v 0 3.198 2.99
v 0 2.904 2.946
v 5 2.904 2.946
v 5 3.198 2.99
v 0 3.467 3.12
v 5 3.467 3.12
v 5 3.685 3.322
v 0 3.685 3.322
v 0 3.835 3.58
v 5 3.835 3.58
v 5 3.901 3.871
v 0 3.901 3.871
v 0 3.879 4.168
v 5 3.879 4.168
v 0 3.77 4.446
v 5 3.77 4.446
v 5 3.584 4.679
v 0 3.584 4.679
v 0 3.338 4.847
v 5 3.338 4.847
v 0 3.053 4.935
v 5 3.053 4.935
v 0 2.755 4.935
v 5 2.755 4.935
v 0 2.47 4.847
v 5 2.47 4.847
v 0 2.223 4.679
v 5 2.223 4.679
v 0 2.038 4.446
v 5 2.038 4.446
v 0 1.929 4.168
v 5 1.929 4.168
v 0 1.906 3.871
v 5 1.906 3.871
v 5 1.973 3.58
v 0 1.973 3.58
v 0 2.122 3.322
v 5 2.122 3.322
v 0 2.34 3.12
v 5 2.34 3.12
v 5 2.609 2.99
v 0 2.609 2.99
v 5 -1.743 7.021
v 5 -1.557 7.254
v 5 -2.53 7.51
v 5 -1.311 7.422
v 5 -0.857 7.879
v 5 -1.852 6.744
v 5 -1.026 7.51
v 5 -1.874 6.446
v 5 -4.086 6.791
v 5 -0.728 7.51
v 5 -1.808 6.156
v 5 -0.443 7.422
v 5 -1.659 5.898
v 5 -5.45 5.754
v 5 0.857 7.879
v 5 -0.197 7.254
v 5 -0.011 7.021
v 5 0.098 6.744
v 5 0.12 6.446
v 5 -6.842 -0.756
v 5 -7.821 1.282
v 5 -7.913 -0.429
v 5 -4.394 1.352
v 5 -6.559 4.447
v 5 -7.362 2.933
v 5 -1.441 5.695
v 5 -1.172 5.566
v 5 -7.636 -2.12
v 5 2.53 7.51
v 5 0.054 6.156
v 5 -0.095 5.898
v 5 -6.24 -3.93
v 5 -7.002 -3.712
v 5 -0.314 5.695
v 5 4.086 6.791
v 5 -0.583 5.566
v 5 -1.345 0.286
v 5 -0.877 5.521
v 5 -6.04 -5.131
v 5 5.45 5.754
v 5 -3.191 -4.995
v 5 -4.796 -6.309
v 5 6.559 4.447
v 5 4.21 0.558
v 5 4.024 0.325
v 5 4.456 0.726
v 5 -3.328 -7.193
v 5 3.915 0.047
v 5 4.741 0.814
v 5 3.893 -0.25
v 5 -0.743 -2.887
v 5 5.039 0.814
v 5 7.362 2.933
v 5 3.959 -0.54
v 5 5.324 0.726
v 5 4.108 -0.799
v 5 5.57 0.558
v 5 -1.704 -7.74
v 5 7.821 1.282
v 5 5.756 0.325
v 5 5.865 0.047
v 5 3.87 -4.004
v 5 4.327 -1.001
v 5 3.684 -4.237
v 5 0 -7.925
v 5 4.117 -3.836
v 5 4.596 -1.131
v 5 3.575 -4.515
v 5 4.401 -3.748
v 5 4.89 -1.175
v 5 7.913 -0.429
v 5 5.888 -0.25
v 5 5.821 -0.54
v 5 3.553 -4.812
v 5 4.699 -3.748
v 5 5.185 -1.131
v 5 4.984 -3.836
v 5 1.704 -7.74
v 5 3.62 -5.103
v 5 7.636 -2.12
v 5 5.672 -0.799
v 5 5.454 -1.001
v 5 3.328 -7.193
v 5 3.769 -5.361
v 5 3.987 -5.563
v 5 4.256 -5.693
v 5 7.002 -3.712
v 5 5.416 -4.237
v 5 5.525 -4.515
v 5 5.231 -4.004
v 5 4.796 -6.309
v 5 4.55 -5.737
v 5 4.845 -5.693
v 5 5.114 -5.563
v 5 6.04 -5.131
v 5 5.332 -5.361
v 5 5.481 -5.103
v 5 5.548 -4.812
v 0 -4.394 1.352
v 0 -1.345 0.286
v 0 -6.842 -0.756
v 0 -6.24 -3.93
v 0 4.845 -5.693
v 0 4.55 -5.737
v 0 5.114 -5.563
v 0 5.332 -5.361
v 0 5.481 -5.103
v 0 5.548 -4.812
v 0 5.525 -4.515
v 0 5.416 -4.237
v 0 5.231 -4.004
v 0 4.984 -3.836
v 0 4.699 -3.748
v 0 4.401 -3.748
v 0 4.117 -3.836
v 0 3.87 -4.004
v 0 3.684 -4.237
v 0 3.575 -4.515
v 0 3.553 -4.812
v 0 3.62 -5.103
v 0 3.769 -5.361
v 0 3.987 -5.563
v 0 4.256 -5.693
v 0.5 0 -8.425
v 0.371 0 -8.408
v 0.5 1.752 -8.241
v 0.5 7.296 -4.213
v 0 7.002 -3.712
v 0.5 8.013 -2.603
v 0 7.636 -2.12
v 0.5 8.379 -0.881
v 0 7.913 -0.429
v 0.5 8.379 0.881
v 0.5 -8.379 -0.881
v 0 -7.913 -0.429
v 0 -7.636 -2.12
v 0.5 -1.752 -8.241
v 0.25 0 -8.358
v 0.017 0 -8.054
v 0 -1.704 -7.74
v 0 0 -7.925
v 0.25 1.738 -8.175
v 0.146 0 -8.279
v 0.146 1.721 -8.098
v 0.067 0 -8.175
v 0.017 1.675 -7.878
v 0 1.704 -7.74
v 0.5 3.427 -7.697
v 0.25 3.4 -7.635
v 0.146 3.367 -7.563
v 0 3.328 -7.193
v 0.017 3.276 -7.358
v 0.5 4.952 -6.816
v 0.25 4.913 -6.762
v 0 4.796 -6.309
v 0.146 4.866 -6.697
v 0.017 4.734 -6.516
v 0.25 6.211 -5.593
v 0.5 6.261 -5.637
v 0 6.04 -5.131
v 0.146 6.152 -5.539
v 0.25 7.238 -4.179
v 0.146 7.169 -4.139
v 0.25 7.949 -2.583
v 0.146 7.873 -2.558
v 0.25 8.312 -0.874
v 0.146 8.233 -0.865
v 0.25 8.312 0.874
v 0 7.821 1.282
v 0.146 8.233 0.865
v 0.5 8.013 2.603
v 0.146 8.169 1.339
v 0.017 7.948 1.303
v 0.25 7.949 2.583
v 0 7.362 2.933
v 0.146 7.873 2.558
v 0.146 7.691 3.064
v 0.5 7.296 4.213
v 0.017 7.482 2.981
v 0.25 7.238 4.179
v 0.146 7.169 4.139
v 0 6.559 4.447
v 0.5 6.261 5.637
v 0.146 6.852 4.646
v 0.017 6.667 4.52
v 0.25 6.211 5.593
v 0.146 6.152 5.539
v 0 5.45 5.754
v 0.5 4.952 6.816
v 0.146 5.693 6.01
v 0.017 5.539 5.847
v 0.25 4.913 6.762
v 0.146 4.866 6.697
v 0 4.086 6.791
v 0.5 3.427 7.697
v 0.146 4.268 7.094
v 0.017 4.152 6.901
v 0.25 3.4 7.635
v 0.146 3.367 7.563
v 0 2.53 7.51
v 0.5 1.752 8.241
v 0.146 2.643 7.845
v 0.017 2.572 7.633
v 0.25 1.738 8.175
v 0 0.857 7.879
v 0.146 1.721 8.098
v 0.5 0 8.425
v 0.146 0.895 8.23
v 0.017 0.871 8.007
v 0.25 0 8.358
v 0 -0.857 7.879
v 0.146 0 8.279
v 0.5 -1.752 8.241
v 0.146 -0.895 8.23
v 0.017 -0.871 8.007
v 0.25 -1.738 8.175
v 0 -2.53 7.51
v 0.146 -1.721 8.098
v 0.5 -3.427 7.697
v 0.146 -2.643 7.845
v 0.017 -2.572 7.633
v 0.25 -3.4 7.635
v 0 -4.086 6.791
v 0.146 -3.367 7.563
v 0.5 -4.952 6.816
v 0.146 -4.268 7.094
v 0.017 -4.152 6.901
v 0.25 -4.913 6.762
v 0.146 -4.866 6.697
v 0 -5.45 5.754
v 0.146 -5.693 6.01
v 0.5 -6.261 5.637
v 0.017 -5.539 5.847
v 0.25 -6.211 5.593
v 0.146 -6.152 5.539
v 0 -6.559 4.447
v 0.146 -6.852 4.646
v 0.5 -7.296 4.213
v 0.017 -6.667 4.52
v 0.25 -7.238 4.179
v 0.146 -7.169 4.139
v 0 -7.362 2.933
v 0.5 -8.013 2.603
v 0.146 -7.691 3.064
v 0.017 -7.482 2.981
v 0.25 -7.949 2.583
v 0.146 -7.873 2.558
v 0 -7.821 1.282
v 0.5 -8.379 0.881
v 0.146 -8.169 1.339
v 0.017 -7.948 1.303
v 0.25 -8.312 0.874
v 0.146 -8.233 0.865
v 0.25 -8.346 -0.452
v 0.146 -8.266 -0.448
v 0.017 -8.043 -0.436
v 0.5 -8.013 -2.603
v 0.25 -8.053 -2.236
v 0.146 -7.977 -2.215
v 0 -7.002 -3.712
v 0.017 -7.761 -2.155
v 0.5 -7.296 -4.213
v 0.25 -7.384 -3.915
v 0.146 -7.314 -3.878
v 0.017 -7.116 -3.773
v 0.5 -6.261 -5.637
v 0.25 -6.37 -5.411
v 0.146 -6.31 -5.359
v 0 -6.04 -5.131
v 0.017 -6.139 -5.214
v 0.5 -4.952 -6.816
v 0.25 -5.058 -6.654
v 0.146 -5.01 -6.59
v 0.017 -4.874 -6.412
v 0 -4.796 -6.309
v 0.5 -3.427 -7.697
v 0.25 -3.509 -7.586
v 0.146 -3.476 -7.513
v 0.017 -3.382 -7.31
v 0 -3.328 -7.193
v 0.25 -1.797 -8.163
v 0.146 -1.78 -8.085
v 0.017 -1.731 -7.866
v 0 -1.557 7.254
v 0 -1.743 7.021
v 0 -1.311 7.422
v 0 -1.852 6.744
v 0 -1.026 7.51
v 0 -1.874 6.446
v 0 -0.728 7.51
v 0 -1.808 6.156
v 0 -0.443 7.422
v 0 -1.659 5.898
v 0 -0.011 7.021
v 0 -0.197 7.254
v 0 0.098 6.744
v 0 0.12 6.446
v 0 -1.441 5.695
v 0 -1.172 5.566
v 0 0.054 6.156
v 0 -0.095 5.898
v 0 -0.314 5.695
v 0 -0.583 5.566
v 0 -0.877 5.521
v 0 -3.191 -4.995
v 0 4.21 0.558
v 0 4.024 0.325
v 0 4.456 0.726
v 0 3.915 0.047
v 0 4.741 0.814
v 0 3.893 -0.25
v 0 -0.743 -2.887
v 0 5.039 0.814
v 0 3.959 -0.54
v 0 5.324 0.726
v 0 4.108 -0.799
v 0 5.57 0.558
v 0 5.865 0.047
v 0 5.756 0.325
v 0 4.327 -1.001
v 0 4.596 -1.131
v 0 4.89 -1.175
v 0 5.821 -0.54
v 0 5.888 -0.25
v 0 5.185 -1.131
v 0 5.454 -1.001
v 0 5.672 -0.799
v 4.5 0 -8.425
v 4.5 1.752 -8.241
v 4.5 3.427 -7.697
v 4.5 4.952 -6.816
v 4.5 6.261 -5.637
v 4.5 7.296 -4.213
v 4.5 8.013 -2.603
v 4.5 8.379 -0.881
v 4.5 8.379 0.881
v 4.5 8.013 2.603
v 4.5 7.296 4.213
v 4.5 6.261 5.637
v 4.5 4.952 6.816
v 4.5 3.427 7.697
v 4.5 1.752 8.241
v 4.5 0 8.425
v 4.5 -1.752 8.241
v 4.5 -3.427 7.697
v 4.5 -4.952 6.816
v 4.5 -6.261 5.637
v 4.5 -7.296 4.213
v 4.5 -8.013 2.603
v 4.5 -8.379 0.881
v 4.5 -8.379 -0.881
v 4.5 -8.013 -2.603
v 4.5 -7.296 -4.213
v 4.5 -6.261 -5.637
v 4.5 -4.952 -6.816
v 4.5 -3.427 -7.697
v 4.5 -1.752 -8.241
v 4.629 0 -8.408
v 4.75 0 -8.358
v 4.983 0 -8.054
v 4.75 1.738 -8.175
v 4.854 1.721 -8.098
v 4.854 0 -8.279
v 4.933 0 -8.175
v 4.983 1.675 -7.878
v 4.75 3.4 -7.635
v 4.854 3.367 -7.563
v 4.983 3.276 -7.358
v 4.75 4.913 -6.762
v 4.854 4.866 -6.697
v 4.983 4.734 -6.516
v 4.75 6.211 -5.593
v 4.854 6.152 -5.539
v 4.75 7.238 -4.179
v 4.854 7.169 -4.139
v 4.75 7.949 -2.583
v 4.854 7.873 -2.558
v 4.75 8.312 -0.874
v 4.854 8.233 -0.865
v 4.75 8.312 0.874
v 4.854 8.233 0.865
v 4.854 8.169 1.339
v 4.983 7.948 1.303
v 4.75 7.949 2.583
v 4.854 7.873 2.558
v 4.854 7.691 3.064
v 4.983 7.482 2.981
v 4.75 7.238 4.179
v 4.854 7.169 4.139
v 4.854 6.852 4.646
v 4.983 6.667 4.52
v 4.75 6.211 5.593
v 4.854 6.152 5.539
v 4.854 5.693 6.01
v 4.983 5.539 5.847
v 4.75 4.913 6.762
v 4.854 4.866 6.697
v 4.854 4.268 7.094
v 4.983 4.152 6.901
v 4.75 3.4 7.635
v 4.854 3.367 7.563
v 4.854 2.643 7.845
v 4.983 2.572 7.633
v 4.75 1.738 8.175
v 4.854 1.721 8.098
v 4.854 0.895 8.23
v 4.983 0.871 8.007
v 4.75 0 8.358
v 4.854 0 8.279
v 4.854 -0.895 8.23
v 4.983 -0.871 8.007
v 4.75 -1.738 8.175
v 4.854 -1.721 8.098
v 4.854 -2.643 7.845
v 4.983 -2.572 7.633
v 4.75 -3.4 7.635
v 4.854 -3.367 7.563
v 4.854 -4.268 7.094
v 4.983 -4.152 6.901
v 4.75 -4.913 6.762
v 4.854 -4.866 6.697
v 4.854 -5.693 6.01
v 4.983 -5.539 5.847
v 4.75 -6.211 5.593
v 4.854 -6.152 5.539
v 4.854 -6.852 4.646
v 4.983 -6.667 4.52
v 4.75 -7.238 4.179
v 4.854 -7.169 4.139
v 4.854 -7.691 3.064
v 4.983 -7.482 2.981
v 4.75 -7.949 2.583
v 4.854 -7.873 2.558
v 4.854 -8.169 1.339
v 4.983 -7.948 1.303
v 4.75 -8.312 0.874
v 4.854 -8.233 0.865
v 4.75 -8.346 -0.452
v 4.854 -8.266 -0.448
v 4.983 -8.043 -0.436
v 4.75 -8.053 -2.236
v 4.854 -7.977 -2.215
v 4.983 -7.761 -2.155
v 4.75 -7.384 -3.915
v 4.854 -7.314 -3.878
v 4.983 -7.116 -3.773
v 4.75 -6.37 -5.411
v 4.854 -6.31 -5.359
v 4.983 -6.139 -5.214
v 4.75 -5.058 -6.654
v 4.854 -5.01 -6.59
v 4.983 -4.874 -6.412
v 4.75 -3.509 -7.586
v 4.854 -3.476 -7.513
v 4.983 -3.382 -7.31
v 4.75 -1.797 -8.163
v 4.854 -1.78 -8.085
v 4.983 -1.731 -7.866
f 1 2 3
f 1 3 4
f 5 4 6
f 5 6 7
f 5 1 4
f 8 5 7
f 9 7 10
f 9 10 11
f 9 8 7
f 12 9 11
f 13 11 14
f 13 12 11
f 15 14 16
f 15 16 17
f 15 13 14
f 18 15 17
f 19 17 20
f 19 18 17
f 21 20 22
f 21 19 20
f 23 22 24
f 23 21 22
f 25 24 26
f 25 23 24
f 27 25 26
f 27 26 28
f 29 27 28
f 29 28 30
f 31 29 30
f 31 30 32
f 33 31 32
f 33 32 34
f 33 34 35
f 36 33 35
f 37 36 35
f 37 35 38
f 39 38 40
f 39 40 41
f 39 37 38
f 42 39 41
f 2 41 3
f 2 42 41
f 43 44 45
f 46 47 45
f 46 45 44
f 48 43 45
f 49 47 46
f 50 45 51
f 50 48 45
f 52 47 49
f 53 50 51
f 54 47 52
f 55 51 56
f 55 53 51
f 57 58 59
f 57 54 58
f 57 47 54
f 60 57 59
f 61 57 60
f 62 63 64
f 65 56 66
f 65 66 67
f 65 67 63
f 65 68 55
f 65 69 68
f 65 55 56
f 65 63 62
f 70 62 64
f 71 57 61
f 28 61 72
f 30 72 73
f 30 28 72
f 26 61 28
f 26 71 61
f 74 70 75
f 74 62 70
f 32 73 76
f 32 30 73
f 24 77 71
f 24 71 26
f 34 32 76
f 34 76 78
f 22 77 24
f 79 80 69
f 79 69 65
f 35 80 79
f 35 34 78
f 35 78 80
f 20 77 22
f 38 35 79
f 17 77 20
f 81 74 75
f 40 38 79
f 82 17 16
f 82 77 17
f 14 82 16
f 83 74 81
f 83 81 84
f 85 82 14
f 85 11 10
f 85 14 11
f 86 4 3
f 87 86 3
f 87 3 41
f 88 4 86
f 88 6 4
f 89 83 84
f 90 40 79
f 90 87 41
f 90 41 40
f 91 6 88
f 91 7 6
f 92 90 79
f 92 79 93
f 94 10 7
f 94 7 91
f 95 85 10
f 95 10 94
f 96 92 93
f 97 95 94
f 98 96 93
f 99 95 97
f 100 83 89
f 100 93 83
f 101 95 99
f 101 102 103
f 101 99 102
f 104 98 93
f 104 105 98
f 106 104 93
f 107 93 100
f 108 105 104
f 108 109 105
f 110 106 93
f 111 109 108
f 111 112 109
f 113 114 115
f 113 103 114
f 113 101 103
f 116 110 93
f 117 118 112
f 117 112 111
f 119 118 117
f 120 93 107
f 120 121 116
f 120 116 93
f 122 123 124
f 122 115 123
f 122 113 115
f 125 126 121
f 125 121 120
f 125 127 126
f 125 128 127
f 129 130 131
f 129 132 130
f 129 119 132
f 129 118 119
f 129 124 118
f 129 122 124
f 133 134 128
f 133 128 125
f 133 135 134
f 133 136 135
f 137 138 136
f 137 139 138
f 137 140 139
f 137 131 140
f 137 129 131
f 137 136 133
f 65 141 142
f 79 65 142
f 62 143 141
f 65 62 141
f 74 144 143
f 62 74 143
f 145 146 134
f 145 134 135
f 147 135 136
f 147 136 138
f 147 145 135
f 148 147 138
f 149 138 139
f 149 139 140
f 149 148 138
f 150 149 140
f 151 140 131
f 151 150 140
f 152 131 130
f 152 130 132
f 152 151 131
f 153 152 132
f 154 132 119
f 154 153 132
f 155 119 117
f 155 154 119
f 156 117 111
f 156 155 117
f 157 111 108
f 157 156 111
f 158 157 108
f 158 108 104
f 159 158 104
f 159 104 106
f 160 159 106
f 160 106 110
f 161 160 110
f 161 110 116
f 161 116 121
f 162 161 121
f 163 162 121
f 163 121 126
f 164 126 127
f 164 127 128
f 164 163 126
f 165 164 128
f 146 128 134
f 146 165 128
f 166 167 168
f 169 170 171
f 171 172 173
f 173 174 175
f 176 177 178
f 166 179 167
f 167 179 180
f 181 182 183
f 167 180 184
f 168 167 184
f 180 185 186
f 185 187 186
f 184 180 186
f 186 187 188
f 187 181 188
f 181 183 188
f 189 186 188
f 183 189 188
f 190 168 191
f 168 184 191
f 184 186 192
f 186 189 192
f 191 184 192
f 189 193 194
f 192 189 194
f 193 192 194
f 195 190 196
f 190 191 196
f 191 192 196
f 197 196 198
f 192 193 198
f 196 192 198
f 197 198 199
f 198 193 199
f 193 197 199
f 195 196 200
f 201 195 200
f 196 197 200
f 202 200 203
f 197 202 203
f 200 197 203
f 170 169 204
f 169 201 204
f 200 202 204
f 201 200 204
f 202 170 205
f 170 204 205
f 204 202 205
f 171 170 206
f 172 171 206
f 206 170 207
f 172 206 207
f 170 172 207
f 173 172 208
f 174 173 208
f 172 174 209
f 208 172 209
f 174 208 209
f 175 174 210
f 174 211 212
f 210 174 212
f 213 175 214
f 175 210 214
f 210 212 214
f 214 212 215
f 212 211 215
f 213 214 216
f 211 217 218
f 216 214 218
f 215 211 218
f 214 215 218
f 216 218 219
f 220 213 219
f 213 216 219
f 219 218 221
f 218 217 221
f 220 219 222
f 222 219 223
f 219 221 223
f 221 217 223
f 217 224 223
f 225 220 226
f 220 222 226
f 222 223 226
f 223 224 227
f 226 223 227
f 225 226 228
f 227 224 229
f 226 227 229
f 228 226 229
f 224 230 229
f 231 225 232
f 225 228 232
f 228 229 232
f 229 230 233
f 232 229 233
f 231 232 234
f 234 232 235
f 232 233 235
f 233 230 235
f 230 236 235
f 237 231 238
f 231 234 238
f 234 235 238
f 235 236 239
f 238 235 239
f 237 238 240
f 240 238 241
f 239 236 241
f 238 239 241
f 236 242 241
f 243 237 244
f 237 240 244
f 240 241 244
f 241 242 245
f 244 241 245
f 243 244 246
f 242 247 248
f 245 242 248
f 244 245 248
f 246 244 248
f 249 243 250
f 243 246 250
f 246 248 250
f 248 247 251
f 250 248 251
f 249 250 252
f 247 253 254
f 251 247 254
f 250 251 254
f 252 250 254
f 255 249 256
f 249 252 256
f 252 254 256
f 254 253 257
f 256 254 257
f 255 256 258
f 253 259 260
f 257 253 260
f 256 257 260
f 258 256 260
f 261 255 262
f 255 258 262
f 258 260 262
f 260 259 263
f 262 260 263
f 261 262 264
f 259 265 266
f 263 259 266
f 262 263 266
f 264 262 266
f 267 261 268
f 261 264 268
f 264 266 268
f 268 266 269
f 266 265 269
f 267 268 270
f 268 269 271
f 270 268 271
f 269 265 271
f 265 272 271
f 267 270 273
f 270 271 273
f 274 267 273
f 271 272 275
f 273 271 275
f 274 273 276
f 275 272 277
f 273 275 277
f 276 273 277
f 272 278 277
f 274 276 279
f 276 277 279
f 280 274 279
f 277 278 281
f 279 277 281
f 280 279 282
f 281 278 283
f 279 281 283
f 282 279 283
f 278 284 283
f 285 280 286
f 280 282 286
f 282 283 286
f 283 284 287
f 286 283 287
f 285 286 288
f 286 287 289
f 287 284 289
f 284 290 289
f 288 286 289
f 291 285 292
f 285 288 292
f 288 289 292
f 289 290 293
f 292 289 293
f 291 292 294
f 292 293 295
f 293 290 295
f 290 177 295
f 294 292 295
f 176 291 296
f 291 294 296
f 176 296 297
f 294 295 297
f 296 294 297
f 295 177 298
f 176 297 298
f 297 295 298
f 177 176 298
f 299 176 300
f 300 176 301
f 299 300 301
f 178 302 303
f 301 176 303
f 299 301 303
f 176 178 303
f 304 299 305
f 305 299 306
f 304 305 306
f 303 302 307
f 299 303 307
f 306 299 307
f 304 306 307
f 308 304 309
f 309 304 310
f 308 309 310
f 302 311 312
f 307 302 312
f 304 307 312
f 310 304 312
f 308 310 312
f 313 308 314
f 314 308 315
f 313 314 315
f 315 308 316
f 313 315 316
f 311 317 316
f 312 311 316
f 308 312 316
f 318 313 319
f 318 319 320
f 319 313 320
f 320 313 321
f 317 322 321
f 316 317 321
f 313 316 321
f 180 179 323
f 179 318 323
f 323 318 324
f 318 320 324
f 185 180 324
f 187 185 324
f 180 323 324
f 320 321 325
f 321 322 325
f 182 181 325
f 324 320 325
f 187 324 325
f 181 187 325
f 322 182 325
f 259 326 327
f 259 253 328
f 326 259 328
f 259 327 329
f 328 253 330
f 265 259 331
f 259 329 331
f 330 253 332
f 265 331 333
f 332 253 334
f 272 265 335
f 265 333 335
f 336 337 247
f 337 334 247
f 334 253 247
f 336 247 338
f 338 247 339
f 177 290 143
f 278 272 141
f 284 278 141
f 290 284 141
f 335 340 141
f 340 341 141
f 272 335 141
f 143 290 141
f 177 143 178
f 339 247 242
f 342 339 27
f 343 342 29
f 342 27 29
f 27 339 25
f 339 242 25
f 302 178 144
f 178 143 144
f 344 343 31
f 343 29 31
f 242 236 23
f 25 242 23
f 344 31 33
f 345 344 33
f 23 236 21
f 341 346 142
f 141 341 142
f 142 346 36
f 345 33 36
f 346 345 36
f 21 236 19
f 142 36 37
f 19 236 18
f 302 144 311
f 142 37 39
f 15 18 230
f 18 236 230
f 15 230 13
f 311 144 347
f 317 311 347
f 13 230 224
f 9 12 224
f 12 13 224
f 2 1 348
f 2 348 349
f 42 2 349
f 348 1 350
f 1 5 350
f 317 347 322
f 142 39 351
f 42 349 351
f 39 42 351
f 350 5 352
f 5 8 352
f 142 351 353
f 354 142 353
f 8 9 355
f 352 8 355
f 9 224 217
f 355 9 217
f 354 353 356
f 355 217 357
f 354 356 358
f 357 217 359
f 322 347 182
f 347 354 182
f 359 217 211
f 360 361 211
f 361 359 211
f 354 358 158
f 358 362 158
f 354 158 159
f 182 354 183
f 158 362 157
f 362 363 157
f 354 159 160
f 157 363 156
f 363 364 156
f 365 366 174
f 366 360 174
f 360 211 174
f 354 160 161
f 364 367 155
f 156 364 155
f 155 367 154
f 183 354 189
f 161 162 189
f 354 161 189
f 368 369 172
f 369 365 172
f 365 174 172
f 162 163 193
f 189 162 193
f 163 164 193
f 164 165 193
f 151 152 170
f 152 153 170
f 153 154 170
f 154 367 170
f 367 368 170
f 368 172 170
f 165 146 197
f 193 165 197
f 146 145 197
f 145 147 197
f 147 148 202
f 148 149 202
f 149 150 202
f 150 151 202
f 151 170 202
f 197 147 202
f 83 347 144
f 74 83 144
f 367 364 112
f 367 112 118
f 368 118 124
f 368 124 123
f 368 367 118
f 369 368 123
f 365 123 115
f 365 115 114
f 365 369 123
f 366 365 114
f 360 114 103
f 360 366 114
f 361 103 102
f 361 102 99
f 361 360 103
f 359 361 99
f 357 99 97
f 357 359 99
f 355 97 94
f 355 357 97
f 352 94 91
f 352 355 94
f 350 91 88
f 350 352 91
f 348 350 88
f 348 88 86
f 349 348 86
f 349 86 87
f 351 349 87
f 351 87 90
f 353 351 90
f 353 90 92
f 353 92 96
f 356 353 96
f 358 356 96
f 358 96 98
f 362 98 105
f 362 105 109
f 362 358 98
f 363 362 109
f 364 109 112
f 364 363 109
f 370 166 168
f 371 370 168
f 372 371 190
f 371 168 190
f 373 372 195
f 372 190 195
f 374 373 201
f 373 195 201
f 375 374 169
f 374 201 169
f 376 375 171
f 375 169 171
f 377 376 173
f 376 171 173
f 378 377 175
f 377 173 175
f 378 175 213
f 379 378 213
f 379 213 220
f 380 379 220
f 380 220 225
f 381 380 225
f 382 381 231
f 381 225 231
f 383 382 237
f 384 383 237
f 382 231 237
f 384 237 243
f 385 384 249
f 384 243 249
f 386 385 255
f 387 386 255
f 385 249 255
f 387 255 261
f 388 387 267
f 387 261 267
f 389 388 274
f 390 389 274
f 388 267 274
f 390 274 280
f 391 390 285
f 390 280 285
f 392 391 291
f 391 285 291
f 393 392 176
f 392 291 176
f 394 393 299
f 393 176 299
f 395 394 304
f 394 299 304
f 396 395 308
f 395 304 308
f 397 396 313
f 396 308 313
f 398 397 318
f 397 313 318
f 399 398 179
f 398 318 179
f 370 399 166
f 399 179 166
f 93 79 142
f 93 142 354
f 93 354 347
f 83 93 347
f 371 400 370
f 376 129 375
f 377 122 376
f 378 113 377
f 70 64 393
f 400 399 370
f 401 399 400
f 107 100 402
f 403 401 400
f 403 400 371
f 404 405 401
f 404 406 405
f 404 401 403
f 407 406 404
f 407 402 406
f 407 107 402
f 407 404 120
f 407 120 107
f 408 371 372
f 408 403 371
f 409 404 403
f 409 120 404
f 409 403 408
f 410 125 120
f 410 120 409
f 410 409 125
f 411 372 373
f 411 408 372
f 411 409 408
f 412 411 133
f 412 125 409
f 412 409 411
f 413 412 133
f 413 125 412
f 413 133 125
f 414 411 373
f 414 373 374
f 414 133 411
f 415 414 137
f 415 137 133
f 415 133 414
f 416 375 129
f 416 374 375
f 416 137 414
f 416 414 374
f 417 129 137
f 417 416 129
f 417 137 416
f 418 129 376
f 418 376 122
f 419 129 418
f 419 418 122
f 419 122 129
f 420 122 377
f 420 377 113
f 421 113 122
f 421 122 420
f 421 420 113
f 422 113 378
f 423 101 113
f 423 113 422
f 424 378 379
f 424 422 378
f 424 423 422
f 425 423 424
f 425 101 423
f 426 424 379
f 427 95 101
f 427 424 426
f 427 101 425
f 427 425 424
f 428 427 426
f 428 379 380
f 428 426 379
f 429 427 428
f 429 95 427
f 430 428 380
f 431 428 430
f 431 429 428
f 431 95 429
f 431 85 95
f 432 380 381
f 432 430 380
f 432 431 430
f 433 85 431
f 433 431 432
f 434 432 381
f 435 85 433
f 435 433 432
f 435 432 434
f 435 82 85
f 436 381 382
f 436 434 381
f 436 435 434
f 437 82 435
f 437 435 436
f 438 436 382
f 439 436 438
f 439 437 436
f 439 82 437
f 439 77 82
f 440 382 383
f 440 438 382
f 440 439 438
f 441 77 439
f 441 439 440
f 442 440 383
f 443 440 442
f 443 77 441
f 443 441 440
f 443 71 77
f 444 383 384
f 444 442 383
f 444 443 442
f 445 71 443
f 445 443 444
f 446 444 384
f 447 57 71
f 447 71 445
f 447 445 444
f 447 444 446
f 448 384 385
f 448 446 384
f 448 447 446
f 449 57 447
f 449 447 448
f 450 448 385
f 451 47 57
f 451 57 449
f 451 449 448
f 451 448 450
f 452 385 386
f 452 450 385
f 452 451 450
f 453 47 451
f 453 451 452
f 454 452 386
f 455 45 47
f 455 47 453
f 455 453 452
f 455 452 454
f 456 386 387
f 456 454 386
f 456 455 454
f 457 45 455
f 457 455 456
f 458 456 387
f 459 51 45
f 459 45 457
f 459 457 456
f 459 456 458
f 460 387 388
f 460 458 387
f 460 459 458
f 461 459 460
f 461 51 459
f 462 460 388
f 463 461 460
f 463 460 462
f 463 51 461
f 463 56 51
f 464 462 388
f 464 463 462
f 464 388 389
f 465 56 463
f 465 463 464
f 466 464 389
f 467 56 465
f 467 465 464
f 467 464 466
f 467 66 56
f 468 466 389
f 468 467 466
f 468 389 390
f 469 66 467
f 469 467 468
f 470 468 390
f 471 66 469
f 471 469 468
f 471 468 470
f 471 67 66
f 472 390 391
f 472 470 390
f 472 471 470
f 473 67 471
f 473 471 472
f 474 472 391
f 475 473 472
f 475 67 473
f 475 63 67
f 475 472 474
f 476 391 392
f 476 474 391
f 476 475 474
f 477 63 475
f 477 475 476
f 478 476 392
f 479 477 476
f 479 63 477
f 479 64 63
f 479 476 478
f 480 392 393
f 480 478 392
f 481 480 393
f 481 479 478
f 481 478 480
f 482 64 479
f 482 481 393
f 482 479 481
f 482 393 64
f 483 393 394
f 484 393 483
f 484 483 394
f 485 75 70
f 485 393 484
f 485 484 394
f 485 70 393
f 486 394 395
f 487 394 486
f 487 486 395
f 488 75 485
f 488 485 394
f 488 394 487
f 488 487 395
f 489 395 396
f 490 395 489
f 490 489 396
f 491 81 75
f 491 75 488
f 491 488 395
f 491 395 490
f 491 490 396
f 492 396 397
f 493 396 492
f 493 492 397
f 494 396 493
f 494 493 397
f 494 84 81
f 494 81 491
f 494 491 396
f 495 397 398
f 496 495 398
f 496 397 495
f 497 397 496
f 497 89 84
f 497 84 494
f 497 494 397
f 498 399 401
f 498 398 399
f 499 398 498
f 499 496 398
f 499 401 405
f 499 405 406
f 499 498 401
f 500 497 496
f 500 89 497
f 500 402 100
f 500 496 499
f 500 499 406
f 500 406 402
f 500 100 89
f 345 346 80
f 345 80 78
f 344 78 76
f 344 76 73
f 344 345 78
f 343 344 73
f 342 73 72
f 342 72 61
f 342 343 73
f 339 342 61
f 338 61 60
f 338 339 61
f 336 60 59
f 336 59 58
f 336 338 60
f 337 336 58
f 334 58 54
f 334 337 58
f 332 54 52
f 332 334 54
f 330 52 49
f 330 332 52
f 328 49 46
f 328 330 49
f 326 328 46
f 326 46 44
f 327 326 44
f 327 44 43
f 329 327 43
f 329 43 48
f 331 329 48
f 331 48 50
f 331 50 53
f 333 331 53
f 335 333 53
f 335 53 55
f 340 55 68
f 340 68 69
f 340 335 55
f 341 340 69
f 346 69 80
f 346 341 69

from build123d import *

# Parameters (mm, degrees)
SKIZZE1_R                       = 8.425
AUFSATZ_LINEAR_AUSTRAGEN1_DEPTH = 5
SKIZZE2_R                       = 1
SCHNITT_LINEAR_AUSTRAGEN1_DEPTH = 5
VERRUNDUNG5_R                   = 0.5
VERRUNDUNG6_R                   = 0.5


with BuildPart() as part:
    # Skizze1 → Aufsatz-Linear austragen1 (new body)
    with BuildSketch(Plane(origin=(0, 0, 0), x_dir=(0, 0, -1), z_dir=(1, 0, 0))):
        Circle(SKIZZE1_R)
    extrude(amount=AUFSATZ_LINEAR_AUSTRAGEN1_DEPTH)

    # Skizze2 → Schnitt-Linear austragen1 (cut)
    with BuildSketch(Plane(origin=(0, 0, 0), x_dir=(0, 0, -1), z_dir=(1, 0, 0))):
        with Locations((4.737160117, 4.550403752)):
            Circle(SKIZZE2_R)
        with Locations((0.175068654, 4.890321488)):
            Circle(SKIZZE2_R)
        with Locations((-3.945777315, 2.90365315)):
            Circle(SKIZZE2_R)
        with Locations((-6.521200441, -0.877275083)):
            Circle(SKIZZE2_R)
        Polygon((-0.286116888, -1.345269379), (2.887315481, -0.743416411), (4.995251626, -3.190762977), (3.929755401, -6.23996251), (0.756323031, -6.841815478), (-1.351613114, -4.394468913), align=None)
    extrude(amount=SCHNITT_LINEAR_AUSTRAGEN1_DEPTH, mode=Mode.SUBTRACT)

    # Verrundung5
    verrundung5_edges = [part.edges().sort_by_distance(p)[0] for p in [
        (5, 0, 8.425),
    ]]
    fillet(verrundung5_edges, radius=VERRUNDUNG5_R)

    # Verrundung6
    verrundung6_edges = [part.edges().sort_by_distance(p)[0] for p in [
        (0, 0, 8.425),
    ]]
    fillet(verrundung6_edges, radius=VERRUNDUNG6_R)


solid = part.part
